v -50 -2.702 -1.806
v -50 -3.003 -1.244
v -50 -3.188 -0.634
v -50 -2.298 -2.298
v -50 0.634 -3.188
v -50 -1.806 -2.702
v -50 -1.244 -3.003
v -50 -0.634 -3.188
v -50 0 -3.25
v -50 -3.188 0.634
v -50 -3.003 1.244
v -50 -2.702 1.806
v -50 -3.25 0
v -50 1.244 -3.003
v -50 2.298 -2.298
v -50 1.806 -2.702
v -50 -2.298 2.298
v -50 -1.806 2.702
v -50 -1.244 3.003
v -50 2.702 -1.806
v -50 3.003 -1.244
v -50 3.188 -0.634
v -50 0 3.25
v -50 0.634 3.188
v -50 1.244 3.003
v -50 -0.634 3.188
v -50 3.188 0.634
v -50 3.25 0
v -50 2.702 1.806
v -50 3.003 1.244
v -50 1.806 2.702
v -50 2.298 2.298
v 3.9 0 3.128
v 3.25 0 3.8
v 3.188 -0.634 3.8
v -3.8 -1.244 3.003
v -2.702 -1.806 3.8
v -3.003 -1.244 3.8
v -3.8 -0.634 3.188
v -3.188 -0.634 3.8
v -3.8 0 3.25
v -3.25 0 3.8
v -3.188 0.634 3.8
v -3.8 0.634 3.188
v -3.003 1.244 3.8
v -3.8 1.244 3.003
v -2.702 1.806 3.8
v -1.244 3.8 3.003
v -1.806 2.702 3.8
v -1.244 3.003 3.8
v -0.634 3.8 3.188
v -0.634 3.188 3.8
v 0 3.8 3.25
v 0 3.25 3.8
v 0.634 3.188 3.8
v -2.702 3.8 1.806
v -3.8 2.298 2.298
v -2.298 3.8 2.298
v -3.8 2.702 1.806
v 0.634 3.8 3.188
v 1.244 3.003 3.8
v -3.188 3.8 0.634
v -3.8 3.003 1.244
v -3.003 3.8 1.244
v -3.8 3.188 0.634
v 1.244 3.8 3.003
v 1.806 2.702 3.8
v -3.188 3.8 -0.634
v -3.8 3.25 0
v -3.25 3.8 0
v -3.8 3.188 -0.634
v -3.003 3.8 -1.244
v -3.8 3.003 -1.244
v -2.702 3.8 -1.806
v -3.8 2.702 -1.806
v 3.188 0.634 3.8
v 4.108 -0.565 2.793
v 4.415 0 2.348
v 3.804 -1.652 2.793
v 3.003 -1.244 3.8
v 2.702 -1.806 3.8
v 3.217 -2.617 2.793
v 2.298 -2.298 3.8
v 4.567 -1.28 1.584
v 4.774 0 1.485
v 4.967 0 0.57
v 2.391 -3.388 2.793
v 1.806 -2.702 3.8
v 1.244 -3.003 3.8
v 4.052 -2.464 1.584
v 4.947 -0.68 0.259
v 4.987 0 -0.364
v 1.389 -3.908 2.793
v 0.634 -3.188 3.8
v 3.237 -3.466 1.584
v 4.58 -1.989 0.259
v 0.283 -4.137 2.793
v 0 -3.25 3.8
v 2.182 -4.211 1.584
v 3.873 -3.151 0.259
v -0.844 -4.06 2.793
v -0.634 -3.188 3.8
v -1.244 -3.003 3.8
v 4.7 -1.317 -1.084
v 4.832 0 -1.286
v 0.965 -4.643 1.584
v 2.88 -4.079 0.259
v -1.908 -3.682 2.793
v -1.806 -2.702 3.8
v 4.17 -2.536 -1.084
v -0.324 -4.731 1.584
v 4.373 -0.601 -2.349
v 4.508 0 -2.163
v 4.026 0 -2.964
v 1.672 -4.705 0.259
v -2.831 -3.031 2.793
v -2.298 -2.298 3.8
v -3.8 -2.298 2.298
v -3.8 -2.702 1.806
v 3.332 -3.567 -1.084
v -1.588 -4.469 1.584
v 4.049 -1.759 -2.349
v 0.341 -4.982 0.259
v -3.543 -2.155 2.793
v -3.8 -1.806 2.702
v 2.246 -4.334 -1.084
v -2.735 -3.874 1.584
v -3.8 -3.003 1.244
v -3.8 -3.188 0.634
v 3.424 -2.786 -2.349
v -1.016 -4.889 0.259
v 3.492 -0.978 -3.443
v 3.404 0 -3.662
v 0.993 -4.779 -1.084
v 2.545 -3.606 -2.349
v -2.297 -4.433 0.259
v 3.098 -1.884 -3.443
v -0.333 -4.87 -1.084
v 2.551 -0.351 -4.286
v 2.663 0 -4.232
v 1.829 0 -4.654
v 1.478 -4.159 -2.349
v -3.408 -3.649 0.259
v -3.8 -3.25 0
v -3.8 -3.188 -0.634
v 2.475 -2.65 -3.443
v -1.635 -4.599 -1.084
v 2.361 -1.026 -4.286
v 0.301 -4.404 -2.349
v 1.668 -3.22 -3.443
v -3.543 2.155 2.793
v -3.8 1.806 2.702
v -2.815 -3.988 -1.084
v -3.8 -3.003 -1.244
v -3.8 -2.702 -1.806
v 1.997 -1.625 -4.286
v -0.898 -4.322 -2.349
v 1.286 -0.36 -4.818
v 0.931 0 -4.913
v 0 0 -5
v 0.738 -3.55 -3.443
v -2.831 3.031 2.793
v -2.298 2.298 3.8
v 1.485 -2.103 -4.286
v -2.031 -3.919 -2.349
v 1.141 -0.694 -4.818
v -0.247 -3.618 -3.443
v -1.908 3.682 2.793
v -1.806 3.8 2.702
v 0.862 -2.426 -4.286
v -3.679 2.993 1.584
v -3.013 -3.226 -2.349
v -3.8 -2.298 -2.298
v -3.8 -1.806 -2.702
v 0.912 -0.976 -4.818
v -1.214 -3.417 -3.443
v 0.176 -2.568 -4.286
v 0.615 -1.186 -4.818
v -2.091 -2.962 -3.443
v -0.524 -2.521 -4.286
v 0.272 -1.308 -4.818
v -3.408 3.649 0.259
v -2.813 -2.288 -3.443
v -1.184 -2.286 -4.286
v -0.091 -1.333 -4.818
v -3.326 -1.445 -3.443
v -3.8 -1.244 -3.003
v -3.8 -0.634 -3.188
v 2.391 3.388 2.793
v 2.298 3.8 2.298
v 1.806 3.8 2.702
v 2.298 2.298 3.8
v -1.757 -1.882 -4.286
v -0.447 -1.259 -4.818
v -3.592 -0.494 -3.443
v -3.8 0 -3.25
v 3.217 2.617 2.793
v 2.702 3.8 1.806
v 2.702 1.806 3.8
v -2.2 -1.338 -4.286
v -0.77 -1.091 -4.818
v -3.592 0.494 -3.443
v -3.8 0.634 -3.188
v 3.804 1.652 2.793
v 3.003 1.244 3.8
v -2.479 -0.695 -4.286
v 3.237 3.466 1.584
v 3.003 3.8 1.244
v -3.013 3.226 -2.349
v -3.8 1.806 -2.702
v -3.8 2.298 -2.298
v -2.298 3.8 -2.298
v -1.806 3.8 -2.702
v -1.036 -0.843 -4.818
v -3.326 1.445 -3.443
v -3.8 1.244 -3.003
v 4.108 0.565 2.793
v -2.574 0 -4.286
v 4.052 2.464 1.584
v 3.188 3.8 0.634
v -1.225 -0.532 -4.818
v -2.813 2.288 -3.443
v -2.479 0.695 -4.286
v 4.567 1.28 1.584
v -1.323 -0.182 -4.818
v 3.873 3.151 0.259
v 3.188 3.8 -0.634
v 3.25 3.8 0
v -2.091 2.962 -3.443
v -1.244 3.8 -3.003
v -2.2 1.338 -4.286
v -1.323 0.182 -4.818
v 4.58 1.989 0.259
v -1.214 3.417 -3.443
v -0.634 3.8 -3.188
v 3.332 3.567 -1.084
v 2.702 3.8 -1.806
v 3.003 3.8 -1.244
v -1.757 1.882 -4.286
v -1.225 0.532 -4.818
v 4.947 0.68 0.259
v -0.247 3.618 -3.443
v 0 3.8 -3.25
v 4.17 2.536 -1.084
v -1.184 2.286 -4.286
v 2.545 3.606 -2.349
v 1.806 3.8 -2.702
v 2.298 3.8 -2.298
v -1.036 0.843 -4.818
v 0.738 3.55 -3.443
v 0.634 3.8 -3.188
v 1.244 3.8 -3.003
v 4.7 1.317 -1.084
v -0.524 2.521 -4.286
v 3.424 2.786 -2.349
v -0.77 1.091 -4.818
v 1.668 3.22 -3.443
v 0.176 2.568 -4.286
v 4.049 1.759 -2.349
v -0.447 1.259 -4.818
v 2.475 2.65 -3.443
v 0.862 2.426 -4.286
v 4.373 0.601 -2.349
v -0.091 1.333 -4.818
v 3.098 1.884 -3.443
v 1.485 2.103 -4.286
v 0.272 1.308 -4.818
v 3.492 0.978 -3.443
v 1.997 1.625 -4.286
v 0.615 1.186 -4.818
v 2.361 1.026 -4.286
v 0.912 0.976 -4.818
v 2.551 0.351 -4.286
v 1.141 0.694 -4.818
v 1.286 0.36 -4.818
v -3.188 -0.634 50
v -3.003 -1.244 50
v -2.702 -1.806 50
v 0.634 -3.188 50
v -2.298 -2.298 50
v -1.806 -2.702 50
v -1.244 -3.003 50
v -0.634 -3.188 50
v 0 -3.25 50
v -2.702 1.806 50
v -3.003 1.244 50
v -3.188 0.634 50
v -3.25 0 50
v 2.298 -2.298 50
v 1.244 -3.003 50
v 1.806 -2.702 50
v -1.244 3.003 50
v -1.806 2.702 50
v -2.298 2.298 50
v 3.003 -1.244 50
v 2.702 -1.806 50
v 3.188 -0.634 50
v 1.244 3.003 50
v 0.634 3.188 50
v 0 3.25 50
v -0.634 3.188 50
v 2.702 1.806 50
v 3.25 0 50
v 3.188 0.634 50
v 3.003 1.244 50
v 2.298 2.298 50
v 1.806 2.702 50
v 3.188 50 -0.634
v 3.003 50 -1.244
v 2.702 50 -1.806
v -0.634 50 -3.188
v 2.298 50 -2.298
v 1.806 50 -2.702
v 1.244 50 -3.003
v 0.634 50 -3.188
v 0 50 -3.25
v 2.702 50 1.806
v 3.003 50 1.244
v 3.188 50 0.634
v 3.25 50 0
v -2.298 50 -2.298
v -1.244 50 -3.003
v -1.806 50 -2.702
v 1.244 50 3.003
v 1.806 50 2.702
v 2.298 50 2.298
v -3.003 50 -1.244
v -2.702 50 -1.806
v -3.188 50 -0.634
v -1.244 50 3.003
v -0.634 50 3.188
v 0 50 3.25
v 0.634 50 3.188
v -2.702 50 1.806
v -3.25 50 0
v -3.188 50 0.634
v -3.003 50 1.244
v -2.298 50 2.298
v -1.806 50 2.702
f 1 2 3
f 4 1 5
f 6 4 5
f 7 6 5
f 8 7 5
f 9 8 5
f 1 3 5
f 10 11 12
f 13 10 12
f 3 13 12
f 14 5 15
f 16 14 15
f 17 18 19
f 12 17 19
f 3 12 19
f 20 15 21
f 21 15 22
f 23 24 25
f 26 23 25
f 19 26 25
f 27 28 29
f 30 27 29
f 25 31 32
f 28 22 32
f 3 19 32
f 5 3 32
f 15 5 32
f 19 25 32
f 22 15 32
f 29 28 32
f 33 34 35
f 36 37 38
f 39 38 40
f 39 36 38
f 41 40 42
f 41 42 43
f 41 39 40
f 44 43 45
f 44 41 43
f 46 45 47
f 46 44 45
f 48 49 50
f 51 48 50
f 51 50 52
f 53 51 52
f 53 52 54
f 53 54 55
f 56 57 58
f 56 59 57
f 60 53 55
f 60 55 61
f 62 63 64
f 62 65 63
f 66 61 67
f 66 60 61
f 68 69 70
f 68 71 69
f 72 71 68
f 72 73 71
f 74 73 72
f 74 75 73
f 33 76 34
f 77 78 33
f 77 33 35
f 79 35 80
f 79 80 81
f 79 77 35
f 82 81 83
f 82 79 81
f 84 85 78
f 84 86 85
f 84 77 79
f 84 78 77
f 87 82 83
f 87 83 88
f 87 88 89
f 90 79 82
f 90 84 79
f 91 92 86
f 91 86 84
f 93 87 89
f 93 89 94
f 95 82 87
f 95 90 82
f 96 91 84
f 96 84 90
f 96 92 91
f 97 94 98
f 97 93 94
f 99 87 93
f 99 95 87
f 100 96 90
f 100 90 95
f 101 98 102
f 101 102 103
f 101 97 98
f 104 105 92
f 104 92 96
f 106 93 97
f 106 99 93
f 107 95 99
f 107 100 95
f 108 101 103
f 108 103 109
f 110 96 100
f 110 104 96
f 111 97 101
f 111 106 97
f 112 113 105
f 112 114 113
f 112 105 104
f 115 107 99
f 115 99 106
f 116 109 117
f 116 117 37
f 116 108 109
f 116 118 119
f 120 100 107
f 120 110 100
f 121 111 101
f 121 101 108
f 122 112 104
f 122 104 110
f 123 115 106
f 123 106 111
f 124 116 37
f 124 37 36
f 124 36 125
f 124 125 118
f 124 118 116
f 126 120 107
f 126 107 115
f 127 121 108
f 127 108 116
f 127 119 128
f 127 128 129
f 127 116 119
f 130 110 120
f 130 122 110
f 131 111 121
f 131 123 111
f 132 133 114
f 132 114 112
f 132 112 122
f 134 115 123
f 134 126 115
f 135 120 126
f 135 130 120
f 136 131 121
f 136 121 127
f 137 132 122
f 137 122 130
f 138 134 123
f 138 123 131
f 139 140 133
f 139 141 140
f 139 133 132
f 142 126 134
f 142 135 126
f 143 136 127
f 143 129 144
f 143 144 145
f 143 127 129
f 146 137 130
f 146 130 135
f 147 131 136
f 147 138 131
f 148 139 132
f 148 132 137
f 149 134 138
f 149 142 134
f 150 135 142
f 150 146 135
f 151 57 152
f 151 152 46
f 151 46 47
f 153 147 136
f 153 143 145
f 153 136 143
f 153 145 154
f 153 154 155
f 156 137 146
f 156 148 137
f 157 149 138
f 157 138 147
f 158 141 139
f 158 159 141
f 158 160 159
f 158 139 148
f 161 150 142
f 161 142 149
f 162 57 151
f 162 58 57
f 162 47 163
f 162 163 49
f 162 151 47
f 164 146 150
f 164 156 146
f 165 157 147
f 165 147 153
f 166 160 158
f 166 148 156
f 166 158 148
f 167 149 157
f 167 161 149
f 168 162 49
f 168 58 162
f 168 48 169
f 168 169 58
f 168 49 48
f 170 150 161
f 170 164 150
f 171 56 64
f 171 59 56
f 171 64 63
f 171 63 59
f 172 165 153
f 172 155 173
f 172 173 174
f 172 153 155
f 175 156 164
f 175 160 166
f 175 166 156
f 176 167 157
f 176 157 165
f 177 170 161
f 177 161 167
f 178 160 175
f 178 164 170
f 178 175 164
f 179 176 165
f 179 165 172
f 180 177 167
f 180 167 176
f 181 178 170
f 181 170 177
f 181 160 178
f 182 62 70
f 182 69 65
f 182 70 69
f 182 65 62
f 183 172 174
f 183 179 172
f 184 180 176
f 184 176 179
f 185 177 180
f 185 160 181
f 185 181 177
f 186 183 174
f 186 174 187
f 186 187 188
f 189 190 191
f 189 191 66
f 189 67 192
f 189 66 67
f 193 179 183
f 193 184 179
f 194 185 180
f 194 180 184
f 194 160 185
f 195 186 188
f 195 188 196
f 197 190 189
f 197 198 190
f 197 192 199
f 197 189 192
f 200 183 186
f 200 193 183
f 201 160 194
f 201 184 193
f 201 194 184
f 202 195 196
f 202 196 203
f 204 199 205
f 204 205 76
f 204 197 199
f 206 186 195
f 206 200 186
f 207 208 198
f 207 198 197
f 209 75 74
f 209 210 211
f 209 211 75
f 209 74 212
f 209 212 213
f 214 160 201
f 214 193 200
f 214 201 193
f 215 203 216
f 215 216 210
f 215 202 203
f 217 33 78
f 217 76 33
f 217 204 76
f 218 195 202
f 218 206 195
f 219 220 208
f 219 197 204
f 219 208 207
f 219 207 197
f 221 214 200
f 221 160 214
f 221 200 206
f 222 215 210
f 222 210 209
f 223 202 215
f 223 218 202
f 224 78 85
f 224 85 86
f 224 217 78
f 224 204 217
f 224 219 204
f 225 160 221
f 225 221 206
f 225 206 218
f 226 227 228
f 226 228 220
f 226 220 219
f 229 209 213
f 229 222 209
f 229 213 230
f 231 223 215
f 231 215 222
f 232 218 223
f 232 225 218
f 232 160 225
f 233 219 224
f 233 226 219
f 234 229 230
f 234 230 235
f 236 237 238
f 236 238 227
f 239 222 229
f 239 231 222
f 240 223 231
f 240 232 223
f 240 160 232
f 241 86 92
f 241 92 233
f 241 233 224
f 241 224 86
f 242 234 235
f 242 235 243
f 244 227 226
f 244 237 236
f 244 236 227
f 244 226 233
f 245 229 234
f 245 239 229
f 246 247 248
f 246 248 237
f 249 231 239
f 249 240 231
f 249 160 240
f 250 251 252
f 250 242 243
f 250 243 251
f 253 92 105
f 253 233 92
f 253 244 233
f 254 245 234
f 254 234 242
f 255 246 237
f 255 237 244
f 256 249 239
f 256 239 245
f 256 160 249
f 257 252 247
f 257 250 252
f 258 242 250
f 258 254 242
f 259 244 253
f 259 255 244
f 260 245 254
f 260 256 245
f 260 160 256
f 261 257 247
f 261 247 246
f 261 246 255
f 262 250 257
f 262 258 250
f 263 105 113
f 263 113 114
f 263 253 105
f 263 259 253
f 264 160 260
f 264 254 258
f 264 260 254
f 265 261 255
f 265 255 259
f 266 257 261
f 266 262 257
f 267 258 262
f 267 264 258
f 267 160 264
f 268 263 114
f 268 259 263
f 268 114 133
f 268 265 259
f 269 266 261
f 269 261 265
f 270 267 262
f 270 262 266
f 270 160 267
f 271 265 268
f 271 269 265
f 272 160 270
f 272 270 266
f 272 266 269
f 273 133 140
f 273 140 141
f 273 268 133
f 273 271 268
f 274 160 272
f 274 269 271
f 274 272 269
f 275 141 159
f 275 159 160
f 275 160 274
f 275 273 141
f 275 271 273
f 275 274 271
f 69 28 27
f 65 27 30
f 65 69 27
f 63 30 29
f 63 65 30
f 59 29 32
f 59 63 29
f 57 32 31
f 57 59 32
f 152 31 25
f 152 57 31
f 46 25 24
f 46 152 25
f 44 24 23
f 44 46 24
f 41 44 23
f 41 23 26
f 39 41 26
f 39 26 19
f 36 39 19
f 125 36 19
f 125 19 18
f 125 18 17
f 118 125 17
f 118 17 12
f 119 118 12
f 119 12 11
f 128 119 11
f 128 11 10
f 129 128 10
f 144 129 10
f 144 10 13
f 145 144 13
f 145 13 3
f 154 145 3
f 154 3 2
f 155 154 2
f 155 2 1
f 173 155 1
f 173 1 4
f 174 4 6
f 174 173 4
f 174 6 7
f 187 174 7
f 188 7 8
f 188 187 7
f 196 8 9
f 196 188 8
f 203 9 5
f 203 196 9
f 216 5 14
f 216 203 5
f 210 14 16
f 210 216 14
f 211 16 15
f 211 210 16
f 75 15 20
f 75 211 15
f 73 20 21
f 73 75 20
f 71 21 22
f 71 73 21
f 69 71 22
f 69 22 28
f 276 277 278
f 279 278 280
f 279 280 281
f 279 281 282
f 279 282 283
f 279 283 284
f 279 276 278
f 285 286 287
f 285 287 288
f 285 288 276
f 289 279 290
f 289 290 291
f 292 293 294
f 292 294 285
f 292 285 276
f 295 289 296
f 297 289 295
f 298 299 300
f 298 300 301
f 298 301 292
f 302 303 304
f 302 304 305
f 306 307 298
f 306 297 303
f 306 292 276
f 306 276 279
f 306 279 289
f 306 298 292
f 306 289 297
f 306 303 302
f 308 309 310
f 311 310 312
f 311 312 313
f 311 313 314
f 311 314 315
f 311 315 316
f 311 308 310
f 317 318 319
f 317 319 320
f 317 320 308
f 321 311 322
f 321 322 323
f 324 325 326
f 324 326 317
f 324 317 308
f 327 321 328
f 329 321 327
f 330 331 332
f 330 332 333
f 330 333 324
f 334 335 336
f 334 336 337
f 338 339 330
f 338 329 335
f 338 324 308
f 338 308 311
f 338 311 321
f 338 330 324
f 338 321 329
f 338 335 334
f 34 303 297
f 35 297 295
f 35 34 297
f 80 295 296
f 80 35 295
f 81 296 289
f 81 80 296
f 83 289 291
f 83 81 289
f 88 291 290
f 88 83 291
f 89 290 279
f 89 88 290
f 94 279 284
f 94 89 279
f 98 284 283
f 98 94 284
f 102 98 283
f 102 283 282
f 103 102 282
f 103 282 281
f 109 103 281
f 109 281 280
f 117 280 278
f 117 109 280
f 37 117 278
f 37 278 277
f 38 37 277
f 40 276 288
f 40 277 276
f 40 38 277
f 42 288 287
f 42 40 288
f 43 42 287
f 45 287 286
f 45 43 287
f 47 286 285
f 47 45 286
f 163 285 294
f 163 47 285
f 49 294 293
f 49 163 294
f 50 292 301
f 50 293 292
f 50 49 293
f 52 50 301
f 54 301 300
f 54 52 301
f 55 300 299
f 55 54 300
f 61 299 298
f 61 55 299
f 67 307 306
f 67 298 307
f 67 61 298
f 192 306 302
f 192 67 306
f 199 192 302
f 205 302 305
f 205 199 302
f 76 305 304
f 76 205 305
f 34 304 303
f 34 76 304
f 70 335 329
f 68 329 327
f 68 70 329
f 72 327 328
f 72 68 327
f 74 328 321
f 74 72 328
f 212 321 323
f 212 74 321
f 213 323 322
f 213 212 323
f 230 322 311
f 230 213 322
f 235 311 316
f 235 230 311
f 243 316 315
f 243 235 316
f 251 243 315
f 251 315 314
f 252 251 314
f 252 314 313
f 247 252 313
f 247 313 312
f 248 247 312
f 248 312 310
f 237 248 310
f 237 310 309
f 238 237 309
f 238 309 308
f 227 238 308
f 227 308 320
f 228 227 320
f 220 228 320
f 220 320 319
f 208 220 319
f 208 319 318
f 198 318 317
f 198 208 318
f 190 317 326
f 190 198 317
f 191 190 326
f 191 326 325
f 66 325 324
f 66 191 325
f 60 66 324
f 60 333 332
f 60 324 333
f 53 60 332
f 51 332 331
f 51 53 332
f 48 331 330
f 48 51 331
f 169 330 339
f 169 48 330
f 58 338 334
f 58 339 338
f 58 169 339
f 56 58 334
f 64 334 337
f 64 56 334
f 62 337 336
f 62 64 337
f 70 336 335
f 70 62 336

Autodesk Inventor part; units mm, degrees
ref_plane "YZ Plane" through (0, 0, 0) normal (1, 0, 0) x (0, 1, 0)
ref_plane "XZ Plane" through (0, 0, 0) normal (0, 1, 0) x (-1, 0, 0)
ref_plane "XY Plane" through (0, 0, 0) normal (0, 0, 1) x (1, 0, 0)
sketch "스케치1" plane through (0, 0, 0) normal (0, 1, 0) x (-1, 0, 0)
  circle A0 centre (0, 0) radius 3.25
  dimension "d0" = 6.5
extrude "돌출1" add sketch "스케치1" along normal blind 50
sketch "스케치2" plane through (0, 0, 0) normal (0, 1, 0) x (-1, 0, 0)
  arc A0 (0, 5) -> (0, -5) centre (0, 0) ccw
  line L0 (0, 5) -> (0, -5)
  line L1 (0, -5.6) -> (0, 5.6) projected
  dimension "d3" = 10
revolve "회전1" add sketch "스케치2" angle 360 about axis through (0, 0, -10) along (0, 0, 1)
sketch "스케치3" plane through (0, 0, 0) normal (0, 0, 1) x (1, 0, 0)
  circle A0 centre (0, 0) radius 3.25
  dimension "d5" = 6.5
extrude "돌출2" add sketch "스케치3" along normal blind 50
sketch "스케치4" plane through (0, 0, 0) normal (1, 0, 0) x (0, 1, 0)
  circle A0 centre (0, 0) radius 3.25
  dimension "d8" = 6.5
extrude "돌출3" add sketch "스케치4" against normal blind 50
properties part number "arrows"
